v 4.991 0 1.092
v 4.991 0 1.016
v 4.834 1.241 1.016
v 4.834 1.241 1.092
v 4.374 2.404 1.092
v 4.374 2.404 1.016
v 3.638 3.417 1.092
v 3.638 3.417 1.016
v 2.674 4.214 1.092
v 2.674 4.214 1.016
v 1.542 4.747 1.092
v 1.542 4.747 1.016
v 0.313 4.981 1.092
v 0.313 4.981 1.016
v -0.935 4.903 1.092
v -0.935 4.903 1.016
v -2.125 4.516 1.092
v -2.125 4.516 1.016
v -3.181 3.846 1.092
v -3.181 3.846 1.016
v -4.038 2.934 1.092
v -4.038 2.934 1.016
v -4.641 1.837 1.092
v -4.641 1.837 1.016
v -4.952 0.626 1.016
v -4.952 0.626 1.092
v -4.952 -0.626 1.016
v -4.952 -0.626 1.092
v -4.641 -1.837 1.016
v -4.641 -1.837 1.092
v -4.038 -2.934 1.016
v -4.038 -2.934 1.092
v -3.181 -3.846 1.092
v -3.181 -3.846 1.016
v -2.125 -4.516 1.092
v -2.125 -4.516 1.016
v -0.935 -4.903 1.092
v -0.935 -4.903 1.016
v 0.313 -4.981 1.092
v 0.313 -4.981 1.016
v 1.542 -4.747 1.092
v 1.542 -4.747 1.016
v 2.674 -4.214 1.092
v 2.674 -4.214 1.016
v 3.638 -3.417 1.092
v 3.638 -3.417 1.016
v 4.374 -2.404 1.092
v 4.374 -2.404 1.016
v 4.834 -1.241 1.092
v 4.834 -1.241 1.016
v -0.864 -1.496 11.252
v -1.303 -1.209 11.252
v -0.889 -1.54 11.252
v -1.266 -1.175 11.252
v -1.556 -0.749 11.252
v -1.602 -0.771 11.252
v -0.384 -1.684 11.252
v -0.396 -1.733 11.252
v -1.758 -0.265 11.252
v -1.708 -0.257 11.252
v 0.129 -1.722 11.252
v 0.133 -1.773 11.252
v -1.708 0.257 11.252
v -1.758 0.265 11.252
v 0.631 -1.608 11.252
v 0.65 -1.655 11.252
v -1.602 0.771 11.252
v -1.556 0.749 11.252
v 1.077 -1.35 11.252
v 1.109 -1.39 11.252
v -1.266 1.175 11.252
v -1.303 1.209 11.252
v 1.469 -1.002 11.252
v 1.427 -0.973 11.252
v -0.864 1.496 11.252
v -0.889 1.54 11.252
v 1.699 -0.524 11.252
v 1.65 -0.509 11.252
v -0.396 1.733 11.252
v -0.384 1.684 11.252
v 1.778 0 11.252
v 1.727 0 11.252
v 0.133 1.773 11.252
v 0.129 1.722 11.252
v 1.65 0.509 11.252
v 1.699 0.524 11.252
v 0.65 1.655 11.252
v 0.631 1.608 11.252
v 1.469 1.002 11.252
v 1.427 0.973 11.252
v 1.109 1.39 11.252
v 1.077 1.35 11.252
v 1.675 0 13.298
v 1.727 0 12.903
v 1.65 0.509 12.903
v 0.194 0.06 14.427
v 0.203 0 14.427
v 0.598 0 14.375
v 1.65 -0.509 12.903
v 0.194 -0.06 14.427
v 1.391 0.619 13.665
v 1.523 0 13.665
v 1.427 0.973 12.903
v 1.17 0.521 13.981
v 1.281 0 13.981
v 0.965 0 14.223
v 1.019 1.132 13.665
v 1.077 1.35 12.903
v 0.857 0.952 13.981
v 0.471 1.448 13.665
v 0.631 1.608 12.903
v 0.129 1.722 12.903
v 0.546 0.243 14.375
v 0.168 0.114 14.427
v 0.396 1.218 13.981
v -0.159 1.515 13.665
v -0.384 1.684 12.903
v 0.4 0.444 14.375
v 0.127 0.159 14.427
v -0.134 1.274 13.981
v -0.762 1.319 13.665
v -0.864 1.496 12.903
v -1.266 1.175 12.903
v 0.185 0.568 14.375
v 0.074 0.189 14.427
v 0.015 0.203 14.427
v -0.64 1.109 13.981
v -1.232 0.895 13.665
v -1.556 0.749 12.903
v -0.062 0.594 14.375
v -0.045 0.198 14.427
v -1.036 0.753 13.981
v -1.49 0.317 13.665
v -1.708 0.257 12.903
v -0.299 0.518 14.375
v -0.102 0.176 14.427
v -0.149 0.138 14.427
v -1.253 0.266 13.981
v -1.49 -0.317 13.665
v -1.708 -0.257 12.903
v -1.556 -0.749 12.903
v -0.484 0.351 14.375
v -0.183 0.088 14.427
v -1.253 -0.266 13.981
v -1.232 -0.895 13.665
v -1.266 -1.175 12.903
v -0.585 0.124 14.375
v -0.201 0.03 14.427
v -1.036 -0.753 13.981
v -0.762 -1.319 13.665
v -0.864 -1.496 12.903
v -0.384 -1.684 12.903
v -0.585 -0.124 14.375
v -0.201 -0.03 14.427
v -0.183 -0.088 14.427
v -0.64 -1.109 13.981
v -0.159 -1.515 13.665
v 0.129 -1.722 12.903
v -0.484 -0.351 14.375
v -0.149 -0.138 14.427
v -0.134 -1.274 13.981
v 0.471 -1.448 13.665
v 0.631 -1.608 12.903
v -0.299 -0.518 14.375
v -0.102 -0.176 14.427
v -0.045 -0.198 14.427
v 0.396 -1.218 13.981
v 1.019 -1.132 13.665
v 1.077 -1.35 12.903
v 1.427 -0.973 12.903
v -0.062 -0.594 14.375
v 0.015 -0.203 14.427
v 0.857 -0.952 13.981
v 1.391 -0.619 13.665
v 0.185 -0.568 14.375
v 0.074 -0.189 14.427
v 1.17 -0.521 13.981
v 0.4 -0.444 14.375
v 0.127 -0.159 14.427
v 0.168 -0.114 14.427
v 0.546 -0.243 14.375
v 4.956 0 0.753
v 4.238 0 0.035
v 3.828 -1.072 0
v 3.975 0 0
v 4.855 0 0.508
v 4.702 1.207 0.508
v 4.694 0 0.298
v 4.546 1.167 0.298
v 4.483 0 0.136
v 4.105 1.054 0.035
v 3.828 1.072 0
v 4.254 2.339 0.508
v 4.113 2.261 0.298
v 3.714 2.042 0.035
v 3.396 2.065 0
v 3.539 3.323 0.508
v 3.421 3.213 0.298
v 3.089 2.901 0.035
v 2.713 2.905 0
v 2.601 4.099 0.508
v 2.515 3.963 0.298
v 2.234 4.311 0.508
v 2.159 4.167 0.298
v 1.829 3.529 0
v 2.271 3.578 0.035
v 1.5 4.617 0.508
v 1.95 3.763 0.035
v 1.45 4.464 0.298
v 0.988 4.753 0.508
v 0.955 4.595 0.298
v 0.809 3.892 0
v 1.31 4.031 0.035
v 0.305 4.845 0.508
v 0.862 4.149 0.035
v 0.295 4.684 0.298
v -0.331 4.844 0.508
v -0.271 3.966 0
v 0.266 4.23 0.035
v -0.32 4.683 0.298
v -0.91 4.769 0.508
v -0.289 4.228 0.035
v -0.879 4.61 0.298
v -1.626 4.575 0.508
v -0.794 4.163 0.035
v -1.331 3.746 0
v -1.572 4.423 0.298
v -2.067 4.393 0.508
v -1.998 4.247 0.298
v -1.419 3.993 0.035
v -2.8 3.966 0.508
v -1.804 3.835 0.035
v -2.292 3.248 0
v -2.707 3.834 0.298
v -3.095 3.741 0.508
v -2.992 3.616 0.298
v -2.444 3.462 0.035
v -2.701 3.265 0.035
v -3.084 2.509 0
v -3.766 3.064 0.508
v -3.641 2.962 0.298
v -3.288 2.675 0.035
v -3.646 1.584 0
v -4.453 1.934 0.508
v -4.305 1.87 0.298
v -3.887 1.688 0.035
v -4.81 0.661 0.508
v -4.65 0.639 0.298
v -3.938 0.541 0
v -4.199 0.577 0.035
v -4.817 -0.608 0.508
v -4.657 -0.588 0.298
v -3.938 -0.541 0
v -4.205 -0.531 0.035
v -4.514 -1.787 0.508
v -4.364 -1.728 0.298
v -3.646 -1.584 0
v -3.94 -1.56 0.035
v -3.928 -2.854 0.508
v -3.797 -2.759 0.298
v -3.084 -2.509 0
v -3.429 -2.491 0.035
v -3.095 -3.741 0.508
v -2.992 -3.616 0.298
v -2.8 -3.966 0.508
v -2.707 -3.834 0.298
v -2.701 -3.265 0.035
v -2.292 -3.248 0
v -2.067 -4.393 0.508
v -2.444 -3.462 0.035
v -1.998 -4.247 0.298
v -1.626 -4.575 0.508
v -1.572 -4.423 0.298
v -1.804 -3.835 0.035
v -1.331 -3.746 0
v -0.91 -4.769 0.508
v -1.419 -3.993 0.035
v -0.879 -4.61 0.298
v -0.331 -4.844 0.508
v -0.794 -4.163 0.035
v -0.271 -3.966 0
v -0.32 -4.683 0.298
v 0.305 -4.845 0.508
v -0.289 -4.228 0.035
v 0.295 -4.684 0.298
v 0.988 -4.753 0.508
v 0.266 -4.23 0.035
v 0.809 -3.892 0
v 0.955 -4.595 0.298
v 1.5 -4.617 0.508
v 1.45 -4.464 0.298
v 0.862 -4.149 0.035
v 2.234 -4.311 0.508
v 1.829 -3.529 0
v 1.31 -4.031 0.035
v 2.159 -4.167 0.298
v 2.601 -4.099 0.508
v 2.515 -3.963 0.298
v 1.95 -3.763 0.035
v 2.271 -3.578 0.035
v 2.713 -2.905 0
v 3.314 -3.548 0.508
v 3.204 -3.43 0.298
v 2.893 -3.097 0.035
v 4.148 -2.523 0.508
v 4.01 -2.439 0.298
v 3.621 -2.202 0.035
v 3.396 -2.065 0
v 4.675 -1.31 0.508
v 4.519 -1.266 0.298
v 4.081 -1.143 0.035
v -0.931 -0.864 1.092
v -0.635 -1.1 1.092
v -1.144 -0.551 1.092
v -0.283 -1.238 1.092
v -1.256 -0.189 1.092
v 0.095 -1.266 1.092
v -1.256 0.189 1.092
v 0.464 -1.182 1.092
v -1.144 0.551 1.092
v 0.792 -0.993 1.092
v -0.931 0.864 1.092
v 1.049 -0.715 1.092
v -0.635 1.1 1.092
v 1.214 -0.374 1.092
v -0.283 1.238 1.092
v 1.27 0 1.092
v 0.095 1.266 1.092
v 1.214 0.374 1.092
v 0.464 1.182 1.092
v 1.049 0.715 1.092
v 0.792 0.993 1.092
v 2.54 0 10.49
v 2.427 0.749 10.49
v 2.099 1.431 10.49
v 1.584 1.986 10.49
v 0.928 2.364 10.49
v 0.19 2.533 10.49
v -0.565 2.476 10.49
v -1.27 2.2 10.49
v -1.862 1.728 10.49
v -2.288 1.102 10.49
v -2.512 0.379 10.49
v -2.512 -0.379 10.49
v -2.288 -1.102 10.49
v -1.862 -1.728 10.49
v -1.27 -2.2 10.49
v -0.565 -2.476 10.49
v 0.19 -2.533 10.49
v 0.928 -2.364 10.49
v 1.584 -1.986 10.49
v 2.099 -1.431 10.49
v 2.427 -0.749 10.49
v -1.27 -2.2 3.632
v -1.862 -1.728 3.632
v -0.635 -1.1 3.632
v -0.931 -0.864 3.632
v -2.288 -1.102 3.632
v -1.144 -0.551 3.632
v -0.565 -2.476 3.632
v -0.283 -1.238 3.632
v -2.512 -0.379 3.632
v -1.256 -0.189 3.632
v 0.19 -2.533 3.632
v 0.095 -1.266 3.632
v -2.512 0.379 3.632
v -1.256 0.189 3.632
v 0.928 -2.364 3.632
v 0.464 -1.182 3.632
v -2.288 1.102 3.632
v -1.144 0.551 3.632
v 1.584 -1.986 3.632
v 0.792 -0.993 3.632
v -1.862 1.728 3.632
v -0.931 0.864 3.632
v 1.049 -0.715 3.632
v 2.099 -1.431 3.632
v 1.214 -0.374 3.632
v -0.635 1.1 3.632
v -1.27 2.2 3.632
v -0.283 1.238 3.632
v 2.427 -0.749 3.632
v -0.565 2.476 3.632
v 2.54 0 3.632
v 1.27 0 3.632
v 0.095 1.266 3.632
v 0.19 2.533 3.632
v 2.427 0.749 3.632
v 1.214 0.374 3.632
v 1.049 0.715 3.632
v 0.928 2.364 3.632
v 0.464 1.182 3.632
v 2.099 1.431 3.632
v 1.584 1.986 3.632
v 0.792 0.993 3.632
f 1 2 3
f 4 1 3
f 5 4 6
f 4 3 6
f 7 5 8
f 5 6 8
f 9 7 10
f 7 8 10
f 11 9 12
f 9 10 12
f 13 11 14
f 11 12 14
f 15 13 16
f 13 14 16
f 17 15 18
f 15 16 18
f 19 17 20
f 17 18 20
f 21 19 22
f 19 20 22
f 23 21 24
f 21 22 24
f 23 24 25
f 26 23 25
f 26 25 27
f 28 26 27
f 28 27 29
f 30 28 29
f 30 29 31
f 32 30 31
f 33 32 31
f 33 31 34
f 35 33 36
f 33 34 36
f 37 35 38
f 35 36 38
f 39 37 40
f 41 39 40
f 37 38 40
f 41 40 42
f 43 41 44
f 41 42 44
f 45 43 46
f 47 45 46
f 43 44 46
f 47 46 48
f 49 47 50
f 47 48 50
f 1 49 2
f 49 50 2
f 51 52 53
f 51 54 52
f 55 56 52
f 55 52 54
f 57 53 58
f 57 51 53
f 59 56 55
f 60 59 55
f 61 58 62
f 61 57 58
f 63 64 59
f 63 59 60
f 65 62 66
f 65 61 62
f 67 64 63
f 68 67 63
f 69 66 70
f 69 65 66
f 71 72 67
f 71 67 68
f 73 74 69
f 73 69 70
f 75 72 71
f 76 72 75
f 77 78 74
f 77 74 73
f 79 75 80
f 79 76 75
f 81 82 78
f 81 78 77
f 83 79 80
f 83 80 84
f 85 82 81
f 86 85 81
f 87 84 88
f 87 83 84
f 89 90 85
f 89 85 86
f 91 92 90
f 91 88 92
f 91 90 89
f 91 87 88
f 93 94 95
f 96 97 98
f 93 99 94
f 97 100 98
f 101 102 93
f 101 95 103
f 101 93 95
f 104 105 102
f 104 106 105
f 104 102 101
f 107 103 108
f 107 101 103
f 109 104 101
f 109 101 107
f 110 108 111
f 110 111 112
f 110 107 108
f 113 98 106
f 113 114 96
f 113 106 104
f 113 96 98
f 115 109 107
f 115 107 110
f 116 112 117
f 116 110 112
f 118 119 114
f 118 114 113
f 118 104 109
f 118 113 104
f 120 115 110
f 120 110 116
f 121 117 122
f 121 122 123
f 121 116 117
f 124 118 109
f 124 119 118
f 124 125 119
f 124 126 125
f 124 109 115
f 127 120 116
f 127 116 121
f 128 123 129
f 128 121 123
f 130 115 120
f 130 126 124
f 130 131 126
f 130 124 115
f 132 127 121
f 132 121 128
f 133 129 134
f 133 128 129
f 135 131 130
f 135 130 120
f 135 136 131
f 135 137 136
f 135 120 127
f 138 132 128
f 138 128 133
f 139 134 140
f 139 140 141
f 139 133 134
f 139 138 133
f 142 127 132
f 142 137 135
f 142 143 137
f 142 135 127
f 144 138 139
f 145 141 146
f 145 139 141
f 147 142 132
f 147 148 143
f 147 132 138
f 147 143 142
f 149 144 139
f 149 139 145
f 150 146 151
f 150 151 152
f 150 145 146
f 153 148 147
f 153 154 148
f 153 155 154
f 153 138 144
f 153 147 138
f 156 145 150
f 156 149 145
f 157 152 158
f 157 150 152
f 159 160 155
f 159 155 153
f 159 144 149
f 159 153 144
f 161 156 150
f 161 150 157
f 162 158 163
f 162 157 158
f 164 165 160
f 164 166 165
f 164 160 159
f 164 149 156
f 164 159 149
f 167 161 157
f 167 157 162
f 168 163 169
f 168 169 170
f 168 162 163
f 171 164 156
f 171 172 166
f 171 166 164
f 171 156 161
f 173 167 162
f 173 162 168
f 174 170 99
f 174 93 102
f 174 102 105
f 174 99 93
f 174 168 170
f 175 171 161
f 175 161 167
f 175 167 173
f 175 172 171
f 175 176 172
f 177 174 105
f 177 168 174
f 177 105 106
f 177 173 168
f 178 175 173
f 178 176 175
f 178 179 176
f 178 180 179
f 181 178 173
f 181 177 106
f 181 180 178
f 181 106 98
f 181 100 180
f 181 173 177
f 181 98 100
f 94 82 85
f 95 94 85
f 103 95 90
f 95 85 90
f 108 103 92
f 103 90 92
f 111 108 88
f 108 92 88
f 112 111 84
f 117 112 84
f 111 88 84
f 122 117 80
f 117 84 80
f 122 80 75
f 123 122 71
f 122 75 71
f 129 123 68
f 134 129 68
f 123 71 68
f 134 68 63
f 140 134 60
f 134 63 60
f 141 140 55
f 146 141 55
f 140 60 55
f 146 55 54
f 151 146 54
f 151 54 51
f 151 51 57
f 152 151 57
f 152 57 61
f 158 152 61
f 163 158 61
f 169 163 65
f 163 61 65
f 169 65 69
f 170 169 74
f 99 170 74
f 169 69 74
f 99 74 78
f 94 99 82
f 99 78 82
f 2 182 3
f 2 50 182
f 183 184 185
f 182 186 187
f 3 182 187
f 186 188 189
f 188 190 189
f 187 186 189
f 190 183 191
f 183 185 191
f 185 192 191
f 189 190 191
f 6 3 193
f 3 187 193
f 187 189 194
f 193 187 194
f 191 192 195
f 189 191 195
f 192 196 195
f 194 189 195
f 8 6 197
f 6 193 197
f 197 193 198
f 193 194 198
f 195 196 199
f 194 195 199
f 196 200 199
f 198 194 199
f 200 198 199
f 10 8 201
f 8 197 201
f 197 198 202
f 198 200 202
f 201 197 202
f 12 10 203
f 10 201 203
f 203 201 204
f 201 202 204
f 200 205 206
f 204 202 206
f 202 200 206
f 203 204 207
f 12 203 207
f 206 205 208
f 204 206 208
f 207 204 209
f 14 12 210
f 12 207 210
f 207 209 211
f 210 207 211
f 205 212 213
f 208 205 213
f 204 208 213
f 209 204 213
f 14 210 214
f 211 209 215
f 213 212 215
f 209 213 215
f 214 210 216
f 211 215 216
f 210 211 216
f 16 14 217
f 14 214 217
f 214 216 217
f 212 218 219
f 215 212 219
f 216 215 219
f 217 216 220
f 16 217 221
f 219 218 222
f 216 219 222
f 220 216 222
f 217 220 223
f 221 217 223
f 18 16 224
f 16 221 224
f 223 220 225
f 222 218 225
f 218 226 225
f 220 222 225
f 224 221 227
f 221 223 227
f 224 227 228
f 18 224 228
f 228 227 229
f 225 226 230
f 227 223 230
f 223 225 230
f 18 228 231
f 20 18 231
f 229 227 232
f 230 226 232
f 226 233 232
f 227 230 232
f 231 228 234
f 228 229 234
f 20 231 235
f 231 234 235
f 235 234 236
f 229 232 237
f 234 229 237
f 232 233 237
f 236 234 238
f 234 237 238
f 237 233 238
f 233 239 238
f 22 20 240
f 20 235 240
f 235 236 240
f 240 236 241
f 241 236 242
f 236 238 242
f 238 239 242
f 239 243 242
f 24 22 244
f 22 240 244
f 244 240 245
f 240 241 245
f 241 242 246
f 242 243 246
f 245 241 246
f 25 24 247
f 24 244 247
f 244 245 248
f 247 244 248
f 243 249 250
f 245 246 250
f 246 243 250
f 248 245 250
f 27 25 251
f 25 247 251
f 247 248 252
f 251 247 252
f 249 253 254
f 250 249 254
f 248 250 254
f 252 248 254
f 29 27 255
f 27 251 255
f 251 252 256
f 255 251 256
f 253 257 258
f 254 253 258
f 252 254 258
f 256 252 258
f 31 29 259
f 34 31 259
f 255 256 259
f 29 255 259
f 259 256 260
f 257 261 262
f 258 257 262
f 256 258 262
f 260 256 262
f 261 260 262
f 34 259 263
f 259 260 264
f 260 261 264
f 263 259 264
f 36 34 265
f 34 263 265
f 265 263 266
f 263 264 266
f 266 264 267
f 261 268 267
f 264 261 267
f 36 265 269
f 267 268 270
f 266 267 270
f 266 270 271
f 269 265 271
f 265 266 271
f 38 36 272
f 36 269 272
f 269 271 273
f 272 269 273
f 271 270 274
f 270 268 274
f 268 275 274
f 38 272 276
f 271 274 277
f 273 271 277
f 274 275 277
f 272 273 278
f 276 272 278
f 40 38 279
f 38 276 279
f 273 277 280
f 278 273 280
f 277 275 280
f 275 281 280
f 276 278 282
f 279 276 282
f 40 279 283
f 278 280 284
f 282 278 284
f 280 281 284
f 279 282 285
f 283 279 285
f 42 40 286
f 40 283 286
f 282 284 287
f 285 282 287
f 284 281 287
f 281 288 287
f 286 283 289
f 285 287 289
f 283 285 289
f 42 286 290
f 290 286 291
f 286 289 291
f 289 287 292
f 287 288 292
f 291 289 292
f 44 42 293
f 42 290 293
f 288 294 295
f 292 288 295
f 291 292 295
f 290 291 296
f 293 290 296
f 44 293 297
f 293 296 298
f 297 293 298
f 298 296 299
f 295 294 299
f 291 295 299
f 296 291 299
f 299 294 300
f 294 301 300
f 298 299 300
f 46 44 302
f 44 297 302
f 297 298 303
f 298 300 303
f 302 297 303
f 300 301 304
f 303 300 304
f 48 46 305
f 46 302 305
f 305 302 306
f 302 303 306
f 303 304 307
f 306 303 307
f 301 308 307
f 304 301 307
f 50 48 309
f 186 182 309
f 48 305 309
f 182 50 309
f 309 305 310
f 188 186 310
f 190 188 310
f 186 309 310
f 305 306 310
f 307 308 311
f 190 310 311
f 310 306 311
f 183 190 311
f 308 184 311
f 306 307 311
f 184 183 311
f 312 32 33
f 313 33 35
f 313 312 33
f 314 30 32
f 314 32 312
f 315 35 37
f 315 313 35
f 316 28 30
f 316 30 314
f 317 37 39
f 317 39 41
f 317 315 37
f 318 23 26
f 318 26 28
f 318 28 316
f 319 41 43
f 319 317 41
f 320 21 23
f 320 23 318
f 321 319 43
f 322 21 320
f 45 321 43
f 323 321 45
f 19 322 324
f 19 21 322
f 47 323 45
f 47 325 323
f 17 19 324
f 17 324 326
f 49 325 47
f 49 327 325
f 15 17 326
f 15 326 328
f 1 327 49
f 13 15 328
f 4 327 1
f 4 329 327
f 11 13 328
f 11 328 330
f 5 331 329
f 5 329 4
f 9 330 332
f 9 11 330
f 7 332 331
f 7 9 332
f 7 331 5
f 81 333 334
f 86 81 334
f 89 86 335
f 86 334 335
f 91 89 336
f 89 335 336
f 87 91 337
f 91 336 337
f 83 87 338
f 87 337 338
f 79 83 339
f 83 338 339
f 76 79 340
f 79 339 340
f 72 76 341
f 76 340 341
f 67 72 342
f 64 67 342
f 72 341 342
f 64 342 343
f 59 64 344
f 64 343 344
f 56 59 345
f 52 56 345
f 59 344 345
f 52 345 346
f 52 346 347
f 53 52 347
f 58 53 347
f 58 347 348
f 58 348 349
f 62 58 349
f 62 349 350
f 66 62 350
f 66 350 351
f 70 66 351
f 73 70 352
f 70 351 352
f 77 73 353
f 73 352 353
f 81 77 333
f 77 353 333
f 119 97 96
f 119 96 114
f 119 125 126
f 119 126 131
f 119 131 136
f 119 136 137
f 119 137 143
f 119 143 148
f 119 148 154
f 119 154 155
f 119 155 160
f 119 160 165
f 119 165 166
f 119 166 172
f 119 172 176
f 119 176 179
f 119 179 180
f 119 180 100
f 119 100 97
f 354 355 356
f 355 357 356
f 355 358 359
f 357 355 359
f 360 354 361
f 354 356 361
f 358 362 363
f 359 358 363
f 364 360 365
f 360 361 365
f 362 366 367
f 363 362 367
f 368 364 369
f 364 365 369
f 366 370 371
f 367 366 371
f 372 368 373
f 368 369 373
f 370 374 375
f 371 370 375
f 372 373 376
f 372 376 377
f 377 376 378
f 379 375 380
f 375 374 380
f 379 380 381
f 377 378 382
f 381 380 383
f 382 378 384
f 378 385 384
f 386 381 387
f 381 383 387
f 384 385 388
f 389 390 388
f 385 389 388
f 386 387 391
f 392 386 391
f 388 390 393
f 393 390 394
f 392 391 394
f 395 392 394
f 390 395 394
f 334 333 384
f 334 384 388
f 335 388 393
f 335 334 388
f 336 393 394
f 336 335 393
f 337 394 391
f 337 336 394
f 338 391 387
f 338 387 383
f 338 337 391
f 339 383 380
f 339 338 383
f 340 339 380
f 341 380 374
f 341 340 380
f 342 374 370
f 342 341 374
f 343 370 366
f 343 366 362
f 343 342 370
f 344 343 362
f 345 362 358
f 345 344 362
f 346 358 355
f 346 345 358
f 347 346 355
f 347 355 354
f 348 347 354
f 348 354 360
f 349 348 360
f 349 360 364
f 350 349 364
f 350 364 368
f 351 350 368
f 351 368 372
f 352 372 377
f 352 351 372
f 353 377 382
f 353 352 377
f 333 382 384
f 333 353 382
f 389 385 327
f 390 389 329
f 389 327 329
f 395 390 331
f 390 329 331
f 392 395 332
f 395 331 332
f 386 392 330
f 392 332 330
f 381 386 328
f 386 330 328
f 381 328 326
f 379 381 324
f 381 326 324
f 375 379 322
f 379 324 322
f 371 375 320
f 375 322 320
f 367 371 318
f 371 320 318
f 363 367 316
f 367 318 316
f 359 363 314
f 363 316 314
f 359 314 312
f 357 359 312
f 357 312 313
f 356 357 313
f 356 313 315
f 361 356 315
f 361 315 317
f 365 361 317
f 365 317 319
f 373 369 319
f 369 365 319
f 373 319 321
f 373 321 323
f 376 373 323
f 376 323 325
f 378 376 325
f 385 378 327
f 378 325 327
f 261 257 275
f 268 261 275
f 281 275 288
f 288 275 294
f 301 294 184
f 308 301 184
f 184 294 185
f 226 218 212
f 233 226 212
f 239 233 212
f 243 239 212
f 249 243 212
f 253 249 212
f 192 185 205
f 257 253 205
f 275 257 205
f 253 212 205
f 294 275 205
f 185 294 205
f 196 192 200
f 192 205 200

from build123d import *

# Parameters (mm, degrees)
SKETCH1_R      = 4.9911
EXTRUDE1_DEPTH = 1.0922
SKETCH2_R      = 1.27
EXTRUDE2_DEPTH = 10.16
SKETCH3_R      = 2.54
EXTRUDE3_DEPTH = 7.62
SKETCH4_R      = 1.7272
EXTRUDE4_DEPTH = 3.175
FILLET1_R      = 1.524
CHAMFER4_SIZE  = 0.762
FILLET2_R      = 1.016


with BuildPart() as part:
    # Sketch1 → Extrude1 (new body)
    with BuildSketch(Plane.XY):
        Circle(SKETCH1_R)
    extrude(amount=EXTRUDE1_DEPTH)

    # Sketch2 → Extrude2 (add)
    with BuildSketch(Plane.XY.offset(1.0922)):
        Circle(SKETCH2_R)
    extrude(amount=EXTRUDE2_DEPTH)

    # Sketch3 → Extrude3 (add)
    with BuildSketch(Plane.XY.offset(11.2522)):
        Circle(SKETCH3_R)
    extrude(amount=-EXTRUDE3_DEPTH)

    # Sketch4 → Extrude4 (add)
    with BuildSketch(Plane.XY.offset(11.2522)):
        Circle(SKETCH4_R)
    extrude(amount=EXTRUDE4_DEPTH)

    # Fillet1
    fillet1_edges = [part.edges().sort_by_distance(p)[0] for p in [
        (-1.7272, 0, 14.4272),
    ]]
    fillet(fillet1_edges, radius=FILLET1_R)

    # Chamfer4
    chamfer4_edges = [part.edges().sort_by_distance(p)[0] for p in [
        (-2.54, 0, 11.2522),
    ]]
    chamfer(chamfer4_edges, length=CHAMFER4_SIZE)

    # Fillet2
    fillet2_edges = [part.edges().sort_by_distance(p)[0] for p in [
        (-4.9911, 0, 0),
    ]]
    fillet(fillet2_edges, radius=FILLET2_R)


solid = part.part
